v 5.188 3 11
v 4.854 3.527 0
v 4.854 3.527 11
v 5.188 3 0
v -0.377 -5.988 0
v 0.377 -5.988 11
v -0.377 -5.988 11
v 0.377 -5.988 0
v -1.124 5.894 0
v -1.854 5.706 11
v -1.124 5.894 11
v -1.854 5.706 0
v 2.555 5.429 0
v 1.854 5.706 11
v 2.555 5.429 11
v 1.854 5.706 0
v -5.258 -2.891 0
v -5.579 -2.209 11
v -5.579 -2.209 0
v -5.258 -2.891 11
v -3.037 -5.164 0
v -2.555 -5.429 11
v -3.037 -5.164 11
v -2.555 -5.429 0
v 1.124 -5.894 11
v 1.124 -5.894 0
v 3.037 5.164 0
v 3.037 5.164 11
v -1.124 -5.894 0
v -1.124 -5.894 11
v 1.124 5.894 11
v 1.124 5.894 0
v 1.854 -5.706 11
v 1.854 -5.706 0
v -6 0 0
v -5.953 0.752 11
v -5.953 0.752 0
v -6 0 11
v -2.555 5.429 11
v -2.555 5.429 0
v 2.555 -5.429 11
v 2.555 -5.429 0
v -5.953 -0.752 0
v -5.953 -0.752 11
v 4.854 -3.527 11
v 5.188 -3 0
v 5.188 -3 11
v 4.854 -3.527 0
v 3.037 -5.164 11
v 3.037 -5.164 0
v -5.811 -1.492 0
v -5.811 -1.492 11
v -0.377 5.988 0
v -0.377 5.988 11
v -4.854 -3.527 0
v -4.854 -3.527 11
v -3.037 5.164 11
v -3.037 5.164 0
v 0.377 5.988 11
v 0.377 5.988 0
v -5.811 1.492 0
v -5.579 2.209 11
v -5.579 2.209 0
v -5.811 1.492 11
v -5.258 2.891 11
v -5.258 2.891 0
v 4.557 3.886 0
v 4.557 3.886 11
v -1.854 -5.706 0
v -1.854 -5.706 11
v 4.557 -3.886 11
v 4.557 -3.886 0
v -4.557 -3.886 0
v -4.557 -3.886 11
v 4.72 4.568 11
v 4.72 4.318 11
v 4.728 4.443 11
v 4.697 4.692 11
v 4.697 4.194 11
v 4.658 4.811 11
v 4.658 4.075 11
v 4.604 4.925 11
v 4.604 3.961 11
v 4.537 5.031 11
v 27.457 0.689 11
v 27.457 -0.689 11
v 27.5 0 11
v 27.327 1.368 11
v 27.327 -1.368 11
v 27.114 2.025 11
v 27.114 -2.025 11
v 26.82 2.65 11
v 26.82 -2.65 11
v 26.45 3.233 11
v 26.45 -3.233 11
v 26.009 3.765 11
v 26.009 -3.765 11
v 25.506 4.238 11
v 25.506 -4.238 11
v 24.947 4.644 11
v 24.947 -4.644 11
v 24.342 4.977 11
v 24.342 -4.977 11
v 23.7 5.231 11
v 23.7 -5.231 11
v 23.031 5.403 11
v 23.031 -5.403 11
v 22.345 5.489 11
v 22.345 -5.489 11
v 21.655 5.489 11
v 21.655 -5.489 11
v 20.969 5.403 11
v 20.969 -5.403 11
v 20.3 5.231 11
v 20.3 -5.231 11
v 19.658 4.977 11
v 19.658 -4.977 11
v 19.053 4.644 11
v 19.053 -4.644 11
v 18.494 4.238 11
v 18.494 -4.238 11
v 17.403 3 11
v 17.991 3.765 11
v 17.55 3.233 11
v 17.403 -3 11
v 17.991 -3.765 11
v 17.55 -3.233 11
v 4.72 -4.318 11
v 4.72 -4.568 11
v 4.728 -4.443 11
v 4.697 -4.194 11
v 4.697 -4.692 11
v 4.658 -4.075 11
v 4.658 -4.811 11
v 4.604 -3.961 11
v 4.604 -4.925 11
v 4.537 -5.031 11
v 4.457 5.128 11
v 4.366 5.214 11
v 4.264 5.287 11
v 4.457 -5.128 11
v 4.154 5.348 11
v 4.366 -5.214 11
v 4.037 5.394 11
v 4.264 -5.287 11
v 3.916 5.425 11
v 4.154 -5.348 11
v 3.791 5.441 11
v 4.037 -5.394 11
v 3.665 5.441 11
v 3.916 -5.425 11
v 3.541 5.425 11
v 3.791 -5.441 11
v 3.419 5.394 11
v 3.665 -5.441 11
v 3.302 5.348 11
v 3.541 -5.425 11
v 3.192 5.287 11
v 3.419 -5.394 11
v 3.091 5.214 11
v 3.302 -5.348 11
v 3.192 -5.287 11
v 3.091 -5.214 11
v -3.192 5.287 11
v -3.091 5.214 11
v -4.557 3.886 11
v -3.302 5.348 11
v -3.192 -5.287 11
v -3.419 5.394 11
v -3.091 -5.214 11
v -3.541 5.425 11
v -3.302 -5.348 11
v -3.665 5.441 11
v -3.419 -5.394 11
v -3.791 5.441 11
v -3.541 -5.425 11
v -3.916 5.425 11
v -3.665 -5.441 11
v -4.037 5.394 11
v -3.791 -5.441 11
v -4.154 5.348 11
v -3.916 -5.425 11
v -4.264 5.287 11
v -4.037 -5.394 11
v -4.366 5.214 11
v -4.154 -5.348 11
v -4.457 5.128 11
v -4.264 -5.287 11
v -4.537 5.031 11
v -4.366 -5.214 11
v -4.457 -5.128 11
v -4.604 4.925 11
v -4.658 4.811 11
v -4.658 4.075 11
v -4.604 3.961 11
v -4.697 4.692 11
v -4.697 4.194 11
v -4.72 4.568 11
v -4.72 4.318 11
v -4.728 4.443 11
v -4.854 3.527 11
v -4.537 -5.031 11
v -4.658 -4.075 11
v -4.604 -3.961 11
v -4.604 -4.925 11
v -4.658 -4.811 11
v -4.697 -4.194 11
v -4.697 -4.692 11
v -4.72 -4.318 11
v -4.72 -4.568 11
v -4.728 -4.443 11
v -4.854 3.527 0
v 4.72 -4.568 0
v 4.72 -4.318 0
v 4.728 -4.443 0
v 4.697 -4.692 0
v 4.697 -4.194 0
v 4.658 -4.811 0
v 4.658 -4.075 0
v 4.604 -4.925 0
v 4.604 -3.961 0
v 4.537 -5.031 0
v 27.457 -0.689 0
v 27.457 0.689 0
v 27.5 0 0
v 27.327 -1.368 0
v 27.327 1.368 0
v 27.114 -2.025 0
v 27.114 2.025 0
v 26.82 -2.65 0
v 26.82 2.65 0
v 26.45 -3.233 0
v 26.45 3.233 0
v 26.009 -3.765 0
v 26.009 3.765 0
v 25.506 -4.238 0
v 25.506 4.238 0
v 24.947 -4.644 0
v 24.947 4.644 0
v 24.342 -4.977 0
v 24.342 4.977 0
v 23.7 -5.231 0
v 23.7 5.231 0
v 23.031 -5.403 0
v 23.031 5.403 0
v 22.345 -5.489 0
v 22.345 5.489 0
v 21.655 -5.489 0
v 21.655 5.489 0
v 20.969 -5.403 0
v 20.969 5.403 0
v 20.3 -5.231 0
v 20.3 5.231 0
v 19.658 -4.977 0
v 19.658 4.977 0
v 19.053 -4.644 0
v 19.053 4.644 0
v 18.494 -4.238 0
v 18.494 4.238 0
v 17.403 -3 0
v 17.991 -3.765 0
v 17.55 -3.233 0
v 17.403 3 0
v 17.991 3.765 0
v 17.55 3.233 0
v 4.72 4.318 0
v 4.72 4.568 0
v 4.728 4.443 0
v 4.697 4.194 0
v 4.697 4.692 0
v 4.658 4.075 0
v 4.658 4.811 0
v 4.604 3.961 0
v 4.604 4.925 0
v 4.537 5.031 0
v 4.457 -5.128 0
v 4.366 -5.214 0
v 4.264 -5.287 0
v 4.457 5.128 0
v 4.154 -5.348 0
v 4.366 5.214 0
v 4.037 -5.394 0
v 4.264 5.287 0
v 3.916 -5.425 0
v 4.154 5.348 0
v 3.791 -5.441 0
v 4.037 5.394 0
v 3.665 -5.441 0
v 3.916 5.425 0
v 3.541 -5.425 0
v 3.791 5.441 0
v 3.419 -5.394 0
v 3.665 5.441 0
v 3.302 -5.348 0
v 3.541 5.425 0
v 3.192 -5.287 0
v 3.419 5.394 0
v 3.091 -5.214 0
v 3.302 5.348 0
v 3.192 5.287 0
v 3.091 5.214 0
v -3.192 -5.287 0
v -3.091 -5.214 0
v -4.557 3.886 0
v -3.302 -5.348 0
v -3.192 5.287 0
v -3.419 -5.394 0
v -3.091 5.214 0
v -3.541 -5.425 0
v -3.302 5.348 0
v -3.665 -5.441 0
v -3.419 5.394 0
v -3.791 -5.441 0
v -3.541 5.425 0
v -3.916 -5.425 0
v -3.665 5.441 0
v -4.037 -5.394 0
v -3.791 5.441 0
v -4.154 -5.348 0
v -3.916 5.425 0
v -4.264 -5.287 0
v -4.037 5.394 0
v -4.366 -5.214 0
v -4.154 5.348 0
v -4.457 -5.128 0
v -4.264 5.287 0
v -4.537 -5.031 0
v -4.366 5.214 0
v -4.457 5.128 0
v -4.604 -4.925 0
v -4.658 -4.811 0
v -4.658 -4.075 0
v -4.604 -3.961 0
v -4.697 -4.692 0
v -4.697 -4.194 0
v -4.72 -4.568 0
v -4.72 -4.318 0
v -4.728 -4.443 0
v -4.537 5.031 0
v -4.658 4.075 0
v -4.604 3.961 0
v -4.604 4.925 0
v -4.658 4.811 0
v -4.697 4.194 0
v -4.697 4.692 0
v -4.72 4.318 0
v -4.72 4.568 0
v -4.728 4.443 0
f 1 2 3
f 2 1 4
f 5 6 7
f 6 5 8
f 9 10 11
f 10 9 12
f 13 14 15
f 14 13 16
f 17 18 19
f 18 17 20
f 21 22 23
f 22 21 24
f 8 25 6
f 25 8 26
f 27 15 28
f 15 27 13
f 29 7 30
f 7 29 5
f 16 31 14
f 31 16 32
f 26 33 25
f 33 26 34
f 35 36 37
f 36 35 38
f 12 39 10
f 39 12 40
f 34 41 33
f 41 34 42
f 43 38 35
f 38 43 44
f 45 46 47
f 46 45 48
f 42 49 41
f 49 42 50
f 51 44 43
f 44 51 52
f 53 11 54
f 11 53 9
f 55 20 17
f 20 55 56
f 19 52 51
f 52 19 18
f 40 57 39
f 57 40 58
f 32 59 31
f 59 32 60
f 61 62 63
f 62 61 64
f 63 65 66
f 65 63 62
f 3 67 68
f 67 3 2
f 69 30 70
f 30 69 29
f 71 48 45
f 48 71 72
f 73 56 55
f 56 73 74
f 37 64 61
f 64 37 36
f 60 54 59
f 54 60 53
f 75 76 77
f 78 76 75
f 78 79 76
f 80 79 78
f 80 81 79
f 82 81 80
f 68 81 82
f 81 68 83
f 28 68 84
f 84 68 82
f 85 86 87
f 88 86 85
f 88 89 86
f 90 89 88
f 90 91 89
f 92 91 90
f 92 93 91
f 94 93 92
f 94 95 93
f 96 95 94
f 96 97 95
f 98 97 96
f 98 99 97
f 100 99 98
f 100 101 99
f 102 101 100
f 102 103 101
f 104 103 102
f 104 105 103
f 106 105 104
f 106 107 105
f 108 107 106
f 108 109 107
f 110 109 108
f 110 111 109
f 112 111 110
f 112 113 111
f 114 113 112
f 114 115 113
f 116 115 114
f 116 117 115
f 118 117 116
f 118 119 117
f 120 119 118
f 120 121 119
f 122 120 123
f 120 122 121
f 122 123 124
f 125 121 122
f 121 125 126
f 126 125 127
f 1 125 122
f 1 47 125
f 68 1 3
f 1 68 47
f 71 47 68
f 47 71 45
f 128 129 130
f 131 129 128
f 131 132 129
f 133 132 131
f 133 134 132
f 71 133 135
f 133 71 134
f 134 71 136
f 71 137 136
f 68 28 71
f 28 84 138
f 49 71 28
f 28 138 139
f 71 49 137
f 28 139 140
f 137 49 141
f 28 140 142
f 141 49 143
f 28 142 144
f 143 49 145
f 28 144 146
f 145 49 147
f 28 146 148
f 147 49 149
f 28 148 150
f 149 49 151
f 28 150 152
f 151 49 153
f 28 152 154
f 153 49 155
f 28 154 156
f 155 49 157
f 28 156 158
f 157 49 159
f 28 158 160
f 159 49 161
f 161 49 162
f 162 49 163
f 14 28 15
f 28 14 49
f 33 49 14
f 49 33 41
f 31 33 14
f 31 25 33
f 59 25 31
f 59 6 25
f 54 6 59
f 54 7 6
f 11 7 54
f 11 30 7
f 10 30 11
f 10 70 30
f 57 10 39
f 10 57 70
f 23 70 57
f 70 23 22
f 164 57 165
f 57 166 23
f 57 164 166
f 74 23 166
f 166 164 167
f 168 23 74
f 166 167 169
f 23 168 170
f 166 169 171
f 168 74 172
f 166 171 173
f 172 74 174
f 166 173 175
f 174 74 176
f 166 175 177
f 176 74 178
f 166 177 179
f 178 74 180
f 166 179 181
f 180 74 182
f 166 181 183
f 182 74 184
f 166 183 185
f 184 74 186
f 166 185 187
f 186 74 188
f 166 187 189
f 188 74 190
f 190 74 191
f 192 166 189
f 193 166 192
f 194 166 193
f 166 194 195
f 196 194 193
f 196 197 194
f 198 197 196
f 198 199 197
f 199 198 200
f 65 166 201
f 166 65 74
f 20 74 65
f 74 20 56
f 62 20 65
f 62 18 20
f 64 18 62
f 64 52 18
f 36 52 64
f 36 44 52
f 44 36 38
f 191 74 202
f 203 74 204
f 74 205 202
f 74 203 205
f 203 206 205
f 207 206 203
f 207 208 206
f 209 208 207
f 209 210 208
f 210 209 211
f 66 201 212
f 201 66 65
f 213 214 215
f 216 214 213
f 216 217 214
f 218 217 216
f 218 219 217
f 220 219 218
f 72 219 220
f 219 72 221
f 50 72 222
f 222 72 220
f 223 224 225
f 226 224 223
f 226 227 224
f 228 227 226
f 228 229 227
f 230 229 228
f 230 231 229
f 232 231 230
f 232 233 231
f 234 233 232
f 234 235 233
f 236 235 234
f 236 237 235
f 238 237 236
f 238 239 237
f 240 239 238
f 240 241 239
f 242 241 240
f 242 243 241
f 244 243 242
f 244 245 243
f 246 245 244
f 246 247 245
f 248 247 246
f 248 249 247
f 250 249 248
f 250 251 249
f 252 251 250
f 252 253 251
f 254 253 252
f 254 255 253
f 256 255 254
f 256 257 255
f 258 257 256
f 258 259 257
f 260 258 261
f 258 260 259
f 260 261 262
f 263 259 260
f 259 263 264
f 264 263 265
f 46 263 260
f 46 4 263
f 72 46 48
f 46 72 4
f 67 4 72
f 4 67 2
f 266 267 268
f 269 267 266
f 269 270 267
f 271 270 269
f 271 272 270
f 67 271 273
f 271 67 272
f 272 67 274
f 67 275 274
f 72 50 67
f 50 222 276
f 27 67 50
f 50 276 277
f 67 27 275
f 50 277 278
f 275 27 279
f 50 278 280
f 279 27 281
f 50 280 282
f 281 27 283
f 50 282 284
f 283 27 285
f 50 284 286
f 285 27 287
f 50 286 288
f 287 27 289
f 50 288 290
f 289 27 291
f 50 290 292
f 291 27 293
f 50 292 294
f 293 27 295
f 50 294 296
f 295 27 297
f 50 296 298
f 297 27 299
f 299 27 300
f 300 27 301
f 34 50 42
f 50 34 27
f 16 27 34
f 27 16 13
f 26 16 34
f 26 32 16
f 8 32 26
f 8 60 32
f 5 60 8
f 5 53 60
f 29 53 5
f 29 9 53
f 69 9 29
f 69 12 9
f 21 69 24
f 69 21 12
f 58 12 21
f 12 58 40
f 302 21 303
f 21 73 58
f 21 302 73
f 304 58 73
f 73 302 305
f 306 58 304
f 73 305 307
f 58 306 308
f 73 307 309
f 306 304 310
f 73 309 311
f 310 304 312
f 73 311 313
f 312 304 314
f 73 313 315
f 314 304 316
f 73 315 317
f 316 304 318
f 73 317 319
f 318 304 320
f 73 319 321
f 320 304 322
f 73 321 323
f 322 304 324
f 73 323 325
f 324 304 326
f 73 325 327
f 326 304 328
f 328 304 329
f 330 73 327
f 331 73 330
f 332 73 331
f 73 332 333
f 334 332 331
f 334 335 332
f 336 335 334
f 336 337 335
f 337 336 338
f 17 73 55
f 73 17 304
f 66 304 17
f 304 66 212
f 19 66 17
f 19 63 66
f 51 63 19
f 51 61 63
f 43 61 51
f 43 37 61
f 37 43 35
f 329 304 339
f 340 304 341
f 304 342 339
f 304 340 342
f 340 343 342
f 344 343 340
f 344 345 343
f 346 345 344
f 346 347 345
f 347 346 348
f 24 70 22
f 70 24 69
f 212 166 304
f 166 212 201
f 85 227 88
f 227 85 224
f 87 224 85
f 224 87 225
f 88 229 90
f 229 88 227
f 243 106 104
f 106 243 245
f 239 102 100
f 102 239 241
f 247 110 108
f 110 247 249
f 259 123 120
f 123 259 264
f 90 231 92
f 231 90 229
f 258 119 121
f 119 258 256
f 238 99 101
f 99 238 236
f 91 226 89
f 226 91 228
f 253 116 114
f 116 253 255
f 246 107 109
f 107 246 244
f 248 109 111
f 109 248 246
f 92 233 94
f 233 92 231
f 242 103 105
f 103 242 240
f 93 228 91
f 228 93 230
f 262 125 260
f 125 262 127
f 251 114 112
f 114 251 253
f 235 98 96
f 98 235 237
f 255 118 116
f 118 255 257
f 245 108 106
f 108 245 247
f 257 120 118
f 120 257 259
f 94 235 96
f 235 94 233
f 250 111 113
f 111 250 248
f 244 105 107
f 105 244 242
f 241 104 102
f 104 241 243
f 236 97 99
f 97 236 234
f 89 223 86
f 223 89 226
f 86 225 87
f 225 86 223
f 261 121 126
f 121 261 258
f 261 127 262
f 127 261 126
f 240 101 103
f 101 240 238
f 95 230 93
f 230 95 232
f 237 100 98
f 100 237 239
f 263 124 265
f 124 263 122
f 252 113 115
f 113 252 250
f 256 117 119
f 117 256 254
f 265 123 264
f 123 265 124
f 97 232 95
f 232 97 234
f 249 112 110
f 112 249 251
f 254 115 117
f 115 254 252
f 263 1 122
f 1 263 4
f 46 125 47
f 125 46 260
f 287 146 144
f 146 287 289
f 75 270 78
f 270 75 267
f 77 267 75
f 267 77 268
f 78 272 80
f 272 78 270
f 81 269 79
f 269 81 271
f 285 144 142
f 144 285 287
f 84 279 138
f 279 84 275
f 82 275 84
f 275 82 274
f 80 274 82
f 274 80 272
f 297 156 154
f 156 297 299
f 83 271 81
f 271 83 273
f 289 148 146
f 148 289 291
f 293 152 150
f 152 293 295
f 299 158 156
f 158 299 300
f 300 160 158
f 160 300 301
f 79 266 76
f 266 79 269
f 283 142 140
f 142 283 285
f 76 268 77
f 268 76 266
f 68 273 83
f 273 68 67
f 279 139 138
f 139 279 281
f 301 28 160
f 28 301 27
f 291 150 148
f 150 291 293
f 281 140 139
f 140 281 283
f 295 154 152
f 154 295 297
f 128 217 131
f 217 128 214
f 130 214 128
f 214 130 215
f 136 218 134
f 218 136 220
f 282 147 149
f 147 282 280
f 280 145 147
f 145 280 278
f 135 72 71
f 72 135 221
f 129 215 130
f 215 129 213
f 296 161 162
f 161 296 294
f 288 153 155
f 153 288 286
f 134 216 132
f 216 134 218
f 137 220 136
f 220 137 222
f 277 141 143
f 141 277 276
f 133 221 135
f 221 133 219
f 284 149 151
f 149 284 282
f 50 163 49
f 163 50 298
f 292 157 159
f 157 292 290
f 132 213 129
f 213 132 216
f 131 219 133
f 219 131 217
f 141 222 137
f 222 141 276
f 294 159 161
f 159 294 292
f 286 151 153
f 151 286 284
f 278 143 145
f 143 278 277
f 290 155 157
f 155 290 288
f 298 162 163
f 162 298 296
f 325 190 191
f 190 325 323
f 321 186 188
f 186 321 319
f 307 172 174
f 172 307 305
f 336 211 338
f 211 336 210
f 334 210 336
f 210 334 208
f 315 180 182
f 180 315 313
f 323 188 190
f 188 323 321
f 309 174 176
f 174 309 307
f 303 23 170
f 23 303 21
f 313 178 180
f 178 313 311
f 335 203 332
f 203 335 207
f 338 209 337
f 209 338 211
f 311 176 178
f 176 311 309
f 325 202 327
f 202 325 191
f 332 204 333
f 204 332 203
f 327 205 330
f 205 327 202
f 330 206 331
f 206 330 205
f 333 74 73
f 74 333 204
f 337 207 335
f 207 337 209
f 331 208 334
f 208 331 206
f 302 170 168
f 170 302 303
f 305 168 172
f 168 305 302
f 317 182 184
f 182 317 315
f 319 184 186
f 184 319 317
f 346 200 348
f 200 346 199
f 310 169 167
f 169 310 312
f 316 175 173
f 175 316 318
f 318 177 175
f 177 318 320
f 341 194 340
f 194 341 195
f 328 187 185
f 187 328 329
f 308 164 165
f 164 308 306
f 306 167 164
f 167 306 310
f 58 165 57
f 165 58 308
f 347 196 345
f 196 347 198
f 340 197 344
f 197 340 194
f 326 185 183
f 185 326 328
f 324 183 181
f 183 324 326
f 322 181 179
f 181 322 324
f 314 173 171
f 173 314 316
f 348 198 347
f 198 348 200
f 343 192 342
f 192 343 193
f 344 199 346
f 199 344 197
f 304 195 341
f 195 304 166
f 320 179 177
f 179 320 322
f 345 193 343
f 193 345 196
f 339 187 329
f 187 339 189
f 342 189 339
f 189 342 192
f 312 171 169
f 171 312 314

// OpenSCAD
// IKEA to BRIO track connector

// Height of the piece. Multiplied by one so that it doesn't appear in Customizer
height = 11*1;

// Radius of the fixed end of the connector (with nods). Multiplied by one so that it doesn't appear in Customizer
fixedrad = 6*1;

// Radius of the male end of the connector. Multiplied by one so that it doesn't appear in Customizer
malerad = 5.5*1;

// Length of the connector
stud_length = 22;

// Thickness of the stud. Multiplied by one so that it doesn't appear in Customizer
studthickness = 6*1;

// Radius of the fixing nods. Multiplied by one so that it doesn't appear in Customizer
nodrad = 1*1;

// How far the fixing nods are recessed within the fixed end of the connector. The greater the value, the less they will protude.
nod_recess = 0.2;

// How the nods are distributed. Multiplied by one so that it doesn't appear in Customizer
nodangle = 40*1;

// The resolution of the curved surfaces. Multiplied by one so that it doesn't appear in Customizer
curveresolution = 50*1;

cylinder(h=height,r=fixedrad,$fn=curveresolution);
translate([stud_length,0,0]) cylinder(h=height,r=malerad,$fn=curveresolution);
translate([0,-studthickness/2,0]) cube(size=[stud_length,studthickness,height]);

// Draw the nods to grip the fixed size

nodposrad = fixedrad-nod_recess;

translate([nodposrad*sin(nodangle),nodposrad*cos(nodangle),0]) 
cylinder(h=height,r=nodrad,$fn=curveresolution);

translate([nodposrad*sin(180-nodangle),nodposrad*cos(180-nodangle),0]) 
cylinder(h=height,r=nodrad,$fn=curveresolution);

translate([nodposrad*sin(nodangle+180),nodposrad*cos(nodangle+180),0]) 
cylinder(h=height,r=nodrad,$fn=curveresolution);

translate([nodposrad*sin(-nodangle),nodposrad*cos(-nodangle),0]) 
cylinder(h=height,r=nodrad,$fn=curveresolution);
